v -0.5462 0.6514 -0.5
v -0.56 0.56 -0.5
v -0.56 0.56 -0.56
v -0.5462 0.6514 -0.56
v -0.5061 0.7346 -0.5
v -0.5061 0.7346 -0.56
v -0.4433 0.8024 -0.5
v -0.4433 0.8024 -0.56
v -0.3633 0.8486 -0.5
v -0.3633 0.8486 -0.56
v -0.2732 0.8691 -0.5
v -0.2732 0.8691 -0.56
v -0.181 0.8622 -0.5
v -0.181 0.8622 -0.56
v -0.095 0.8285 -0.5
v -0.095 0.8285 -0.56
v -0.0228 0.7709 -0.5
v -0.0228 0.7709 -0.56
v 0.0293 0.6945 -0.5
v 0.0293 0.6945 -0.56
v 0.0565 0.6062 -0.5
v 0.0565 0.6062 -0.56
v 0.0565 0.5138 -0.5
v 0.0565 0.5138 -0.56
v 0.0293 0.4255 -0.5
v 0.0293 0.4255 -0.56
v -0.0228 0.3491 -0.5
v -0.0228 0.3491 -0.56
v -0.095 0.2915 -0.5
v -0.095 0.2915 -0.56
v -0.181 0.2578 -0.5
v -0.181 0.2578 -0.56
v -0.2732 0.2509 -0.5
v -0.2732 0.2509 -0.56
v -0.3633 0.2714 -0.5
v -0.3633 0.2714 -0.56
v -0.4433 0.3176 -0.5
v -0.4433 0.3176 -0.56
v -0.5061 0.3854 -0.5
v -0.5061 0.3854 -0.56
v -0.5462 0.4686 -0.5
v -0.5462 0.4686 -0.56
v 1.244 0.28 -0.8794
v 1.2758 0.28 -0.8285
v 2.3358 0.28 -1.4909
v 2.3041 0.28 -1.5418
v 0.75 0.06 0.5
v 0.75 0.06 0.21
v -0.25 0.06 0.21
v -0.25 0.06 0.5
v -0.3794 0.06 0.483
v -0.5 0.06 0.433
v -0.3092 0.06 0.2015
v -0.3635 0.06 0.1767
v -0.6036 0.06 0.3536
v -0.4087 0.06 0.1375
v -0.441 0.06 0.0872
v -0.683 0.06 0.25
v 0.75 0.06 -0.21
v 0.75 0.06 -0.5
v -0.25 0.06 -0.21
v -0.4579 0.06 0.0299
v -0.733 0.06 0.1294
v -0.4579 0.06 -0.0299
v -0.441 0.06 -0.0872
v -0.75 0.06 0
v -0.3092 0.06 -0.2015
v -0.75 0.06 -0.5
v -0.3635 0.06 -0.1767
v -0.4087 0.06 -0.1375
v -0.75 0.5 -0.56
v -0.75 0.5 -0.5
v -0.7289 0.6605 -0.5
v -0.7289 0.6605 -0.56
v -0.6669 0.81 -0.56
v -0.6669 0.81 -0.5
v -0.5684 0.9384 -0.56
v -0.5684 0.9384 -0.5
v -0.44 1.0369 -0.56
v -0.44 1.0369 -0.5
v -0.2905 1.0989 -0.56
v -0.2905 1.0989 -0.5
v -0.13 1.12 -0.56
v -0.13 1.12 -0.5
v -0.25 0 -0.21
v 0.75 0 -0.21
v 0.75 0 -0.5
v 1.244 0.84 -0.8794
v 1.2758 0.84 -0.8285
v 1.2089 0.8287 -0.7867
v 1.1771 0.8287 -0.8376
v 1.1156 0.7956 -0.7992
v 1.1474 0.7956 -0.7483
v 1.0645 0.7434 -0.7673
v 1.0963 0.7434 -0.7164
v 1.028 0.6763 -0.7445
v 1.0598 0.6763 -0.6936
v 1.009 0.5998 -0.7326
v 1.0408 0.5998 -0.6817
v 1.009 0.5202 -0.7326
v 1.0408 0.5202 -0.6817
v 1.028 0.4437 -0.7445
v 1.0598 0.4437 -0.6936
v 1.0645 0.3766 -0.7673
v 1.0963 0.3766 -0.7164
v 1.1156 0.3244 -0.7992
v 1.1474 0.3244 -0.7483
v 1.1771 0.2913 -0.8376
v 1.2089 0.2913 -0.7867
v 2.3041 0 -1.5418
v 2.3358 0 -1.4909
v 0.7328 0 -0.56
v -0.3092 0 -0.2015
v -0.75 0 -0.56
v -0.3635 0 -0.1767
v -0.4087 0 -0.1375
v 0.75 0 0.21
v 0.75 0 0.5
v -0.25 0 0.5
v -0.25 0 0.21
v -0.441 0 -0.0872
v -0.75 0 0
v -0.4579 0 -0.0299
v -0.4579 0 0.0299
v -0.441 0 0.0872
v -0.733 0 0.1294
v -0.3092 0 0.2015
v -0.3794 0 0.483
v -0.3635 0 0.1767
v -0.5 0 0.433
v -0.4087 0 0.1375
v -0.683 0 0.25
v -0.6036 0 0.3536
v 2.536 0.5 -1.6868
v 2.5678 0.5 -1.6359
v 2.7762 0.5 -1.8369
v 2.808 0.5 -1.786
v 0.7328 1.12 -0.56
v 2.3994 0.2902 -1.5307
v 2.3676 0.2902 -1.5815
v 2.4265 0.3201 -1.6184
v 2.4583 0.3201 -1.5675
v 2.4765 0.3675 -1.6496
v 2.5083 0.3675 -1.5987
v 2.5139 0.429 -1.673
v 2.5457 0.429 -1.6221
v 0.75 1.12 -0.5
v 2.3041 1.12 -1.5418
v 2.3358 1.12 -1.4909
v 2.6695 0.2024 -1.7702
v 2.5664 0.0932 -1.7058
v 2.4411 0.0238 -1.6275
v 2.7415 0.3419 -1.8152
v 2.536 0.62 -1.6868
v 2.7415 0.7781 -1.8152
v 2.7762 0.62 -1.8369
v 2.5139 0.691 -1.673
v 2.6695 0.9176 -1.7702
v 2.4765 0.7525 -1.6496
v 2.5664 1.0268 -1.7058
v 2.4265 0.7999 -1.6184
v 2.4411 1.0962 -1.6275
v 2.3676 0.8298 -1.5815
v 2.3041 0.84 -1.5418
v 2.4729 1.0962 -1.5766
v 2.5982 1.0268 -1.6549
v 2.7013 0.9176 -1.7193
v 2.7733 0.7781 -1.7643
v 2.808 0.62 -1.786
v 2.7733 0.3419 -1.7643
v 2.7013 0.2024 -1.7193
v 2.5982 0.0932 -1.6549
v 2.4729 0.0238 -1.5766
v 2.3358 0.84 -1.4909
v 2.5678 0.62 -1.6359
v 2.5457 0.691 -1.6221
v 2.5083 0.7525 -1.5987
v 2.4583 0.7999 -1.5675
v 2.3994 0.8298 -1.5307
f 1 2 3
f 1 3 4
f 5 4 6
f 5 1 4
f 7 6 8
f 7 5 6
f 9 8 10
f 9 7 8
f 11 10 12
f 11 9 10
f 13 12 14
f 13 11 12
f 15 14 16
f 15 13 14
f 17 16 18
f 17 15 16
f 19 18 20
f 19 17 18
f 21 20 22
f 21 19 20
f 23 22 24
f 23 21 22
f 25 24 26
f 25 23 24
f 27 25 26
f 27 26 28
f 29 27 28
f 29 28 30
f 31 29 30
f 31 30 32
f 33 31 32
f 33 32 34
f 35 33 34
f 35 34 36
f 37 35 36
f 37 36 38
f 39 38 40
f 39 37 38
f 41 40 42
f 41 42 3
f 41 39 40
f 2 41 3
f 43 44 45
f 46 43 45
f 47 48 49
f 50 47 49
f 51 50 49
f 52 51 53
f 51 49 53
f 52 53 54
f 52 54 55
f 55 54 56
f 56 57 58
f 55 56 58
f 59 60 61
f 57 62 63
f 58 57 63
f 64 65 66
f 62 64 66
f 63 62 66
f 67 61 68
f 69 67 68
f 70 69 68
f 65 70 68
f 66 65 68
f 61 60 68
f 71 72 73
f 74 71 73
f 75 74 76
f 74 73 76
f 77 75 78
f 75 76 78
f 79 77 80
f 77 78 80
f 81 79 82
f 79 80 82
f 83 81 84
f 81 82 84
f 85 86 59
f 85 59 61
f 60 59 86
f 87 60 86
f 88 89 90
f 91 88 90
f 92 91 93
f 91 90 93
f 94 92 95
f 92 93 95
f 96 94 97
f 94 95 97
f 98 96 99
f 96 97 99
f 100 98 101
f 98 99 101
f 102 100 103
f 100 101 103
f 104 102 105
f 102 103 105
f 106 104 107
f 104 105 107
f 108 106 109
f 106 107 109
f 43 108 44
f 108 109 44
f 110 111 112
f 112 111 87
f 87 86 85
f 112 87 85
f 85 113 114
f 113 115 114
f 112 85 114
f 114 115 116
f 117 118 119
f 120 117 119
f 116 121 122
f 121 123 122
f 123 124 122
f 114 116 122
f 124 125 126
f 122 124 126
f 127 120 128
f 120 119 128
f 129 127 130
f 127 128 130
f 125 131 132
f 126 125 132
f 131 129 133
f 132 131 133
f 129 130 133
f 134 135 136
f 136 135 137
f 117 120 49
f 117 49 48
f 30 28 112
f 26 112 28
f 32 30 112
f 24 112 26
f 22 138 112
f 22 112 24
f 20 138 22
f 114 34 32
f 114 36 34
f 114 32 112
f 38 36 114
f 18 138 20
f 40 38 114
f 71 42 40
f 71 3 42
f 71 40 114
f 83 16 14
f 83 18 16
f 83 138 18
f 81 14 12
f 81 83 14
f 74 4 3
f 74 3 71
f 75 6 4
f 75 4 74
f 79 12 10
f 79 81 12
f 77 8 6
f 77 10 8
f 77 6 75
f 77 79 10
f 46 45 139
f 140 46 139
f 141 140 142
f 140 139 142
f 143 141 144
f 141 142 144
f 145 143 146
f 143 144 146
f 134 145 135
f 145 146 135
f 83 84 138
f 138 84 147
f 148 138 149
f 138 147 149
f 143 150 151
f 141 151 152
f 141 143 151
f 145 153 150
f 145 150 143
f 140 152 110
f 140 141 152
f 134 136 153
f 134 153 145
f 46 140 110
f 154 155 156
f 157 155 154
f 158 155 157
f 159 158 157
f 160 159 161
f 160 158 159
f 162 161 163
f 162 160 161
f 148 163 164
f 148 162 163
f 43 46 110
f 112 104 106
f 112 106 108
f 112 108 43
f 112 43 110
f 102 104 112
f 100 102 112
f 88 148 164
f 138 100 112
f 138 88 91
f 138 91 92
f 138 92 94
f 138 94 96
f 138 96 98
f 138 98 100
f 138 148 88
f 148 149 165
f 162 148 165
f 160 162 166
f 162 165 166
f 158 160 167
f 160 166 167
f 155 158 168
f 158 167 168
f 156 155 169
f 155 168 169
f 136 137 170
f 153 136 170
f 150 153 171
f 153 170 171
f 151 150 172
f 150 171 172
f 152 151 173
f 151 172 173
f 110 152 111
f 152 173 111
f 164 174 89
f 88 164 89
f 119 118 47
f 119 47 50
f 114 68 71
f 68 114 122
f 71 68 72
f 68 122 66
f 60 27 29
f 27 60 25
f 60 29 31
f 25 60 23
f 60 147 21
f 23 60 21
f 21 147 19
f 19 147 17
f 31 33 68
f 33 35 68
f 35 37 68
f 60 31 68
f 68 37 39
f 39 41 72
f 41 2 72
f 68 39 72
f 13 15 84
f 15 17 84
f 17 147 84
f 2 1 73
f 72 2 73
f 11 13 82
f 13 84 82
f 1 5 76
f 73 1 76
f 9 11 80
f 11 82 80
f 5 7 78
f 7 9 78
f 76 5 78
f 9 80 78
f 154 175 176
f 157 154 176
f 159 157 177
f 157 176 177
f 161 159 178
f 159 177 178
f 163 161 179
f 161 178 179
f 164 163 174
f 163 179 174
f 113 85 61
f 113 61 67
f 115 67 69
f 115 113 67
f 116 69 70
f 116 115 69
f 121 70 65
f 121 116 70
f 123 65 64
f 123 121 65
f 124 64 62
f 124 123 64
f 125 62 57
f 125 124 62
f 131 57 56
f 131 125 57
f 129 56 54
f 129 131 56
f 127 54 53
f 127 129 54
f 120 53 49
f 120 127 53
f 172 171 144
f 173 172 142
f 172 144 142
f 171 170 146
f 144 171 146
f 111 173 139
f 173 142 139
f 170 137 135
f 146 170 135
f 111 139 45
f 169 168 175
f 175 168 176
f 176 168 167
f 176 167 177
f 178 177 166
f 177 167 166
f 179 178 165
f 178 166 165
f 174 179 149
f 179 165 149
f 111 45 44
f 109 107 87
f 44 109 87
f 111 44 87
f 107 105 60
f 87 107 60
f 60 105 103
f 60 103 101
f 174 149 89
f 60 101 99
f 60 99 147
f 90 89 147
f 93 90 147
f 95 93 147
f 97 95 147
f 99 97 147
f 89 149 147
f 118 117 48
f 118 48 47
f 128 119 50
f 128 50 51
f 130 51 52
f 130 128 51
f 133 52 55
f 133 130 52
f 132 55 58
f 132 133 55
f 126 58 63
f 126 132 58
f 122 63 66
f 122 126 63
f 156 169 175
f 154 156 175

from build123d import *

# Parameters (mm, degrees)
BOSS_EXTRUDE1_DEPTH = 0.06
SKETCH3_R           = 0.31
BOSS_EXTRUDE2_DEPTH = 0.06
BOSS_EXTRUDE3_DEPTH = 0.06


with BuildPart() as part:
    # Sketch1 → Boss-Extrude1 (new body)
    with BuildSketch(Plane(origin=(0, 0, 0), x_dir=(1, 0, 0), z_dir=(0, 1, 0))):
        with BuildLine():
            Line((-0.75, 0.5), (0.75, 0.5))
            Line((0.75, 0.5), (0.75, 0.21))
            Line((0.75, 0.21), (-0.25, 0.21))
            ThreePointArc((-0.25, 0.21), (-0.46, 0), (-0.25, -0.21))
            Line((-0.25, -0.21), (0.75, -0.21))
            Line((0.75, -0.21), (0.75, -0.5))
            Line((0.75, -0.5), (-0.25, -0.5))
            ThreePointArc((-0.25, -0.5), (-0.603553391, -0.353553391), (-0.75, 0))
            Line((-0.75, 0), (-0.75, 0.5))
        make_face()
    extrude(amount=BOSS_EXTRUDE1_DEPTH)

    # Sketch3 → Boss-Extrude2 (add)
    with BuildSketch(Plane(origin=(0, 0, -0.5), x_dir=(-1, 0, 0), z_dir=(0, 0, -1))):
        with BuildLine():
            Line((-0.75, 0), (0.75, 0))
            Line((0.75, 0), (0.75, 0.5))
            ThreePointArc((0.75, 0.5), (0.568406204, 0.938406204), (0.13, 1.12))
            Line((0.13, 1.12), (-0.75, 1.12))
            Line((-0.75, 1.12), (-0.75, 0))
        make_face()
        with Locations((0.25, 0.56)):
            Circle(SKETCH3_R, mode=Mode.SUBTRACT)
    extrude(amount=BOSS_EXTRUDE2_DEPTH)

    # Sketch6 → Boss-Extrude3 (add)
    with BuildSketch(Plane(origin=(-0.014087692, 0, -0.022545019), x_dir=(-0.8480480961564253, 0, 0.529919264233206), z_dir=(-0.529919264233206, 0, -0.8480480961564253))):
        with BuildLine():
            Line((-0.900995704, 1.12), (-2.770995704, 1.12))
            ThreePointArc((-2.770995704, 1.12), (-3.145161443, 0.976653333), (-3.327772141, 0.62))
            Line((-3.327772141, 0.62), (-3.044491591, 0.62))
            ThreePointArc((-3.044491591, 0.62), (-2.946494992, 0.778174242), (-2.770995704, 0.84))
            Line((-2.770995704, 0.84), (-1.520995704, 0.84))
            ThreePointArc((-1.520995704, 0.84), (-1.240995704, 0.56), (-1.520995704, 0.28))
            Line((-1.520995704, 0.28), (-2.770995704, 0.28))
            ThreePointArc((-2.770995704, 0.28), (-2.946494992, 0.341825758), (-3.044491591, 0.5))
            Line((-3.044491591, 0.5), (-3.327772141, 0.5))
            ThreePointArc((-3.327772141, 0.5), (-3.145161443, 0.143346667), (-2.770995704, 0))
            Line((-2.770995704, 0), (-0.900995704, 0))
            Line((-0.900995704, 0), (-0.900995704, 1.12))
        make_face()
    extrude(amount=BOSS_EXTRUDE3_DEPTH)


solid = part.part
